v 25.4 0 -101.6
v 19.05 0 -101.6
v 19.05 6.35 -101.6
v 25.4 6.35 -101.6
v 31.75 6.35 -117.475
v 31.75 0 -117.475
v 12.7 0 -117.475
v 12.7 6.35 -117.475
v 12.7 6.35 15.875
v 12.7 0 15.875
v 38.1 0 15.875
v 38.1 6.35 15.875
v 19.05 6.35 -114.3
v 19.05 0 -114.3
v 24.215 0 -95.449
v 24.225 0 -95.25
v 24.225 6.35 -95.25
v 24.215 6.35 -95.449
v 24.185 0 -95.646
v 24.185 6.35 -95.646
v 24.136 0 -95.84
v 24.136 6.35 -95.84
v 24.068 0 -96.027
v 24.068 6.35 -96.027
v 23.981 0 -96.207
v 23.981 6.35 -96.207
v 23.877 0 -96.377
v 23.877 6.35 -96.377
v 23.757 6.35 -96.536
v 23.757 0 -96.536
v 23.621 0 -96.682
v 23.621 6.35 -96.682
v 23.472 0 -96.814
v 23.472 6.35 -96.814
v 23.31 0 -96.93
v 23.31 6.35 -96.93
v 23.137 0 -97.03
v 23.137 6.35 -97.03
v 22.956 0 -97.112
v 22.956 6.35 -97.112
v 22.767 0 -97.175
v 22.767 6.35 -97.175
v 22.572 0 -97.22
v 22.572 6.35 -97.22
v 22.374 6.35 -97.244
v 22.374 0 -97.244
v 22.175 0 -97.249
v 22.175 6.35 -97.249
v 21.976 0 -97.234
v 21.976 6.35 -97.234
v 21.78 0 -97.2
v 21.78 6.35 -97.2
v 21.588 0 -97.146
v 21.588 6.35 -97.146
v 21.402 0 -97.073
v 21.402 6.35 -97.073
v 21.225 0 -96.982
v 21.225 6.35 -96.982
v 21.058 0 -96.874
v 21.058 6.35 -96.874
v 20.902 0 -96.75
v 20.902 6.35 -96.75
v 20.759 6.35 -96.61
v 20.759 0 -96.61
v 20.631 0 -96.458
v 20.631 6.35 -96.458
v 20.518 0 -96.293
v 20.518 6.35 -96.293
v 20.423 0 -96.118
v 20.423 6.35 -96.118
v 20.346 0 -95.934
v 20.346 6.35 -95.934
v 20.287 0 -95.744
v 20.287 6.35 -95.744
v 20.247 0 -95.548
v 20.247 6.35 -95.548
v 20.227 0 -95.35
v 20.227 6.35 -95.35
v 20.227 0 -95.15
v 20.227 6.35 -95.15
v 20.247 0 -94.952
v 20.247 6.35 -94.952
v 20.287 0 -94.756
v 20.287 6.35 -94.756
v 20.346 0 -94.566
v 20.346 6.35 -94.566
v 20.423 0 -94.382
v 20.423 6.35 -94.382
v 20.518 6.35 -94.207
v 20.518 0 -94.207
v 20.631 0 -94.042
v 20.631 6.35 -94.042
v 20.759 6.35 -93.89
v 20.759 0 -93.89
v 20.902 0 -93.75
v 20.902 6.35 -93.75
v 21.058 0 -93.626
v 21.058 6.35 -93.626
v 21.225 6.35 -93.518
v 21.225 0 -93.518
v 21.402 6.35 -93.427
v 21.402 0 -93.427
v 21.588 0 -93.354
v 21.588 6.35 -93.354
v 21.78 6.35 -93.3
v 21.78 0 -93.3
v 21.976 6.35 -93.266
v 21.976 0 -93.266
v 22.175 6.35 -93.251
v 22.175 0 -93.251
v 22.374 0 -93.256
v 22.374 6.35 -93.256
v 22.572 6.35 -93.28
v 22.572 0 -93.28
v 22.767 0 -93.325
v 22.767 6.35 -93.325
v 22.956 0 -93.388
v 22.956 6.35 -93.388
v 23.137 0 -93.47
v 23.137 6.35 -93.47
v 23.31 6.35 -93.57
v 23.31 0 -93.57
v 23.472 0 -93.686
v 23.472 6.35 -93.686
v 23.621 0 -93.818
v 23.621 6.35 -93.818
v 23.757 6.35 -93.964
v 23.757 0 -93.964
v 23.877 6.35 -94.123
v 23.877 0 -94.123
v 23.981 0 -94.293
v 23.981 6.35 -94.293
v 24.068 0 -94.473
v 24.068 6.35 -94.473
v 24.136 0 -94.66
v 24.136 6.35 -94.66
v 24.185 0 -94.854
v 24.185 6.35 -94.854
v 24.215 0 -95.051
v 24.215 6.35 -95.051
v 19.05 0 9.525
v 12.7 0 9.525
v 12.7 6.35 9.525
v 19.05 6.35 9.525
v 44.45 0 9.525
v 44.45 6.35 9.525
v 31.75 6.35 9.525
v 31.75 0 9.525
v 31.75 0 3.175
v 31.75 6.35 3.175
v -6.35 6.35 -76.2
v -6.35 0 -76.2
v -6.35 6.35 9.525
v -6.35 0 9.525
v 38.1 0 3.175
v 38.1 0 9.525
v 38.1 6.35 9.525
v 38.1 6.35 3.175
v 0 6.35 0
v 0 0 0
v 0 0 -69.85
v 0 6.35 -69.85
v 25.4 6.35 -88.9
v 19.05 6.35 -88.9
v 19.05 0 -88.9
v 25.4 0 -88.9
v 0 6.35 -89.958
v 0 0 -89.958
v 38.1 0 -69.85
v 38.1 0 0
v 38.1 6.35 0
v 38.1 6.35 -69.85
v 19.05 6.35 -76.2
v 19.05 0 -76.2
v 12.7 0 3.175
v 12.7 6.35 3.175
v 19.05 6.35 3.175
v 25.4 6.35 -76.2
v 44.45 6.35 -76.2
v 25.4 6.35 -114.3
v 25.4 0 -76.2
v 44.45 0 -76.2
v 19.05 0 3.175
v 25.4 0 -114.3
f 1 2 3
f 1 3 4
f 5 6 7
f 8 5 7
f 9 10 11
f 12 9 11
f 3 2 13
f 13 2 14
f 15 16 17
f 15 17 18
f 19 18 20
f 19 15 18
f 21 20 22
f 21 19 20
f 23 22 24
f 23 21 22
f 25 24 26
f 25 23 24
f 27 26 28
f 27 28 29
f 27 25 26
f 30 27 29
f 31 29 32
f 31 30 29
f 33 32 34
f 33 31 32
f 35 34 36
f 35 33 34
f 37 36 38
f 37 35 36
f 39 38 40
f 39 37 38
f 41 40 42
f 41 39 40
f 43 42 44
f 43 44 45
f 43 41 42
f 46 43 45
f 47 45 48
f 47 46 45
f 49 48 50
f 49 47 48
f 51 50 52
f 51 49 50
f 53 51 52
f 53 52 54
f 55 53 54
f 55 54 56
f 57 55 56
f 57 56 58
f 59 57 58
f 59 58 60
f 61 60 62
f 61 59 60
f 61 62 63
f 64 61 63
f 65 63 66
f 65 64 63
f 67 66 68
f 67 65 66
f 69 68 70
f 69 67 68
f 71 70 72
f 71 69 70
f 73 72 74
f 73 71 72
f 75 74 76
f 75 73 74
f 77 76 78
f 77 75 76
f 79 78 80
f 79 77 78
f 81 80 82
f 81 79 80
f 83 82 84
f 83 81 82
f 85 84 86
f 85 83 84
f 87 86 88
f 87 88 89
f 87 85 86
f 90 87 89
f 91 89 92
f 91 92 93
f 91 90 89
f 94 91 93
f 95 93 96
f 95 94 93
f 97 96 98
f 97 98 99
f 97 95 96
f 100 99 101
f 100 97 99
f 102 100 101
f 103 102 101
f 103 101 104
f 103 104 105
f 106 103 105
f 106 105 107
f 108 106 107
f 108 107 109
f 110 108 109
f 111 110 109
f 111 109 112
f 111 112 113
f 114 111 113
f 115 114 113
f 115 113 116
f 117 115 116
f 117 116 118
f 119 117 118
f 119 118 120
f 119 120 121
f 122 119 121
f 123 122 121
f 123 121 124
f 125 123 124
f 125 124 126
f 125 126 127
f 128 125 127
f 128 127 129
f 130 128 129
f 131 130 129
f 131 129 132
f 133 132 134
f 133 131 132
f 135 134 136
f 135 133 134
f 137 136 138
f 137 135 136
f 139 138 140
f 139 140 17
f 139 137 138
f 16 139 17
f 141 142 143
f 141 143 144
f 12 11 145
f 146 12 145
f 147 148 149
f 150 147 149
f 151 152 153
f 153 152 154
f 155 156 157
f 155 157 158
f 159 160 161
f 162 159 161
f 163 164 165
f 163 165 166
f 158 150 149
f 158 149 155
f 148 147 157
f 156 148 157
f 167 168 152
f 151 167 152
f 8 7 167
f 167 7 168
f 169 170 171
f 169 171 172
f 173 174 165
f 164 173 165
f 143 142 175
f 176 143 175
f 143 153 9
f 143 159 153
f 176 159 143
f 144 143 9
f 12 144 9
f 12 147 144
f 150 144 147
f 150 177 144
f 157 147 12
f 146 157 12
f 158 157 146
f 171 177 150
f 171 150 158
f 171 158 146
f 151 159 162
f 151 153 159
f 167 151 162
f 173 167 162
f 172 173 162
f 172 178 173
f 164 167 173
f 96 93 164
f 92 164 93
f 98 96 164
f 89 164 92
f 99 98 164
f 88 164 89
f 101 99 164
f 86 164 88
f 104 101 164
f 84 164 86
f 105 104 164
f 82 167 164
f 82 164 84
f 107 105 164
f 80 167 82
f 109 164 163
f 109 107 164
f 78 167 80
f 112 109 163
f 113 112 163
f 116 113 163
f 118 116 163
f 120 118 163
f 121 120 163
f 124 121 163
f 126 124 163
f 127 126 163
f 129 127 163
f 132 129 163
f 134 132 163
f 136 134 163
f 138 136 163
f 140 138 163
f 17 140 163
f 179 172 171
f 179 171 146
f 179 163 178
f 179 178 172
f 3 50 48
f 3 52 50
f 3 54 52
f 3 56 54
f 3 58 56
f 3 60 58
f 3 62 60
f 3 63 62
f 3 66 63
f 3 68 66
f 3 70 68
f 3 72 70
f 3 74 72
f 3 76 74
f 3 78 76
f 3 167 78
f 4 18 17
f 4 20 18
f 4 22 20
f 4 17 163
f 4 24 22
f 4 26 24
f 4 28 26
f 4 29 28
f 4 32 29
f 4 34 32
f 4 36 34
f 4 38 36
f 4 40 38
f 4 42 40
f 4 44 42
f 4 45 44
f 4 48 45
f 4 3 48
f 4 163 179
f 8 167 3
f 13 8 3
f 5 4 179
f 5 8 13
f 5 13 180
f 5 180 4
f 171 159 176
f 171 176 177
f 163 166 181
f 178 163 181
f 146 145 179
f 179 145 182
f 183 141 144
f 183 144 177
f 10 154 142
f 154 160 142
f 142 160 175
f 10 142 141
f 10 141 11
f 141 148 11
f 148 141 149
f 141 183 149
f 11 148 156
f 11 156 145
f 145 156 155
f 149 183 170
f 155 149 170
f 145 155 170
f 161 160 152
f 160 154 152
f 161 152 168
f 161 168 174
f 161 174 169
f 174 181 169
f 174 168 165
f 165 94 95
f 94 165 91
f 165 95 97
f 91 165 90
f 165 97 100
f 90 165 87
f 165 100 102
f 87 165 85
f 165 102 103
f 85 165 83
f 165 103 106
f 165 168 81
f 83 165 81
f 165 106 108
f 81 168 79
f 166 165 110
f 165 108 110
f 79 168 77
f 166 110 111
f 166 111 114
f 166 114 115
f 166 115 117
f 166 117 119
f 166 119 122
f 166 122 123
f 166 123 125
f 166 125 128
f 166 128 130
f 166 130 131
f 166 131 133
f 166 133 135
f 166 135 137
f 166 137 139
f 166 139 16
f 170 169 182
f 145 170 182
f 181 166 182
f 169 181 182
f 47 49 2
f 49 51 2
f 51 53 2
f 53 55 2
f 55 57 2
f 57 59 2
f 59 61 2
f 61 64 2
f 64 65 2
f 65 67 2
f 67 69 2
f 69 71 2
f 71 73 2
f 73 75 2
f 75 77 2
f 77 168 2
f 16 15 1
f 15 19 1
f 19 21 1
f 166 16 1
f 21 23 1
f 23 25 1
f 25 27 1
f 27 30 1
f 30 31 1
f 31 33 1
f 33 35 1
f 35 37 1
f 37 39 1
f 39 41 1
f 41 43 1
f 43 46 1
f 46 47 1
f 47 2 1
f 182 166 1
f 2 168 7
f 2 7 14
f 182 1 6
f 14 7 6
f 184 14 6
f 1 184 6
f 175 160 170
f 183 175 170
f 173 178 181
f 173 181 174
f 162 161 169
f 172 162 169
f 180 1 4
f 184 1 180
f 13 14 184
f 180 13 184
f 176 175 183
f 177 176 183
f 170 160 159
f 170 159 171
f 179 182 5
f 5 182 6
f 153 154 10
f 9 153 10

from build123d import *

# Parameters (mm, degrees)
SKETCH1_R           = 2
SKETCH1_W           = 6.35
SKETCH1_H           = 12.7
SKETCH1_H_2         = 6.35
SKETCH1_W_2         = 38.1
SKETCH1_H_3         = 69.85
BOSS_EXTRUDE1_DEPTH = 6.35


with BuildPart() as part:
    # Sketch1 → Boss-Extrude1 (new body)
    with BuildSketch(Plane(origin=(0, 0, 0), x_dir=(1, 0, 0), z_dir=(0, 1, 0))):
        Polygon((12.7, 117.475), (0, 89.958333333), (0, 76.2), (19.05, 76.2), (19.05, 88.9), (25.4, 88.9), (25.4, 76.2), (38.1, 76.2), (38.1, 96.8375), (31.75, 117.475), align=None)
        with Locations((22.225, 95.25)):
            Circle(SKETCH1_R, mode=Mode.SUBTRACT)
        with Locations((22.225, 107.95)):
            Rectangle(SKETCH1_W, SKETCH1_H, mode=Mode.SUBTRACT)
        Polygon((0, 76.2), (-6.35, 76.2), (-6.35, -9.525), (12.7, -15.875), (38.1, -15.875), (44.45, -9.525), (44.45, 76.2), (38.1, 76.2), (25.4, 76.2), (19.05, 76.2), align=None)
        with Locations((15.875, -6.35)):
            Rectangle(SKETCH1_W, SKETCH1_H_2, mode=Mode.SUBTRACT)
        with Locations((34.925, -6.35)):
            Rectangle(SKETCH1_W, SKETCH1_H_2, mode=Mode.SUBTRACT)
        with Locations((19.05, 34.925)):
            Rectangle(SKETCH1_W_2, SKETCH1_H_3, mode=Mode.SUBTRACT)
        Polygon((0, 89.958333333), (-6.35, 76.2), (0, 76.2), align=None)
        Polygon((44.45, 76.2), (38.1, 96.8375), (38.1, 76.2), align=None)
    extrude(amount=BOSS_EXTRUDE1_DEPTH)


solid = part.part
